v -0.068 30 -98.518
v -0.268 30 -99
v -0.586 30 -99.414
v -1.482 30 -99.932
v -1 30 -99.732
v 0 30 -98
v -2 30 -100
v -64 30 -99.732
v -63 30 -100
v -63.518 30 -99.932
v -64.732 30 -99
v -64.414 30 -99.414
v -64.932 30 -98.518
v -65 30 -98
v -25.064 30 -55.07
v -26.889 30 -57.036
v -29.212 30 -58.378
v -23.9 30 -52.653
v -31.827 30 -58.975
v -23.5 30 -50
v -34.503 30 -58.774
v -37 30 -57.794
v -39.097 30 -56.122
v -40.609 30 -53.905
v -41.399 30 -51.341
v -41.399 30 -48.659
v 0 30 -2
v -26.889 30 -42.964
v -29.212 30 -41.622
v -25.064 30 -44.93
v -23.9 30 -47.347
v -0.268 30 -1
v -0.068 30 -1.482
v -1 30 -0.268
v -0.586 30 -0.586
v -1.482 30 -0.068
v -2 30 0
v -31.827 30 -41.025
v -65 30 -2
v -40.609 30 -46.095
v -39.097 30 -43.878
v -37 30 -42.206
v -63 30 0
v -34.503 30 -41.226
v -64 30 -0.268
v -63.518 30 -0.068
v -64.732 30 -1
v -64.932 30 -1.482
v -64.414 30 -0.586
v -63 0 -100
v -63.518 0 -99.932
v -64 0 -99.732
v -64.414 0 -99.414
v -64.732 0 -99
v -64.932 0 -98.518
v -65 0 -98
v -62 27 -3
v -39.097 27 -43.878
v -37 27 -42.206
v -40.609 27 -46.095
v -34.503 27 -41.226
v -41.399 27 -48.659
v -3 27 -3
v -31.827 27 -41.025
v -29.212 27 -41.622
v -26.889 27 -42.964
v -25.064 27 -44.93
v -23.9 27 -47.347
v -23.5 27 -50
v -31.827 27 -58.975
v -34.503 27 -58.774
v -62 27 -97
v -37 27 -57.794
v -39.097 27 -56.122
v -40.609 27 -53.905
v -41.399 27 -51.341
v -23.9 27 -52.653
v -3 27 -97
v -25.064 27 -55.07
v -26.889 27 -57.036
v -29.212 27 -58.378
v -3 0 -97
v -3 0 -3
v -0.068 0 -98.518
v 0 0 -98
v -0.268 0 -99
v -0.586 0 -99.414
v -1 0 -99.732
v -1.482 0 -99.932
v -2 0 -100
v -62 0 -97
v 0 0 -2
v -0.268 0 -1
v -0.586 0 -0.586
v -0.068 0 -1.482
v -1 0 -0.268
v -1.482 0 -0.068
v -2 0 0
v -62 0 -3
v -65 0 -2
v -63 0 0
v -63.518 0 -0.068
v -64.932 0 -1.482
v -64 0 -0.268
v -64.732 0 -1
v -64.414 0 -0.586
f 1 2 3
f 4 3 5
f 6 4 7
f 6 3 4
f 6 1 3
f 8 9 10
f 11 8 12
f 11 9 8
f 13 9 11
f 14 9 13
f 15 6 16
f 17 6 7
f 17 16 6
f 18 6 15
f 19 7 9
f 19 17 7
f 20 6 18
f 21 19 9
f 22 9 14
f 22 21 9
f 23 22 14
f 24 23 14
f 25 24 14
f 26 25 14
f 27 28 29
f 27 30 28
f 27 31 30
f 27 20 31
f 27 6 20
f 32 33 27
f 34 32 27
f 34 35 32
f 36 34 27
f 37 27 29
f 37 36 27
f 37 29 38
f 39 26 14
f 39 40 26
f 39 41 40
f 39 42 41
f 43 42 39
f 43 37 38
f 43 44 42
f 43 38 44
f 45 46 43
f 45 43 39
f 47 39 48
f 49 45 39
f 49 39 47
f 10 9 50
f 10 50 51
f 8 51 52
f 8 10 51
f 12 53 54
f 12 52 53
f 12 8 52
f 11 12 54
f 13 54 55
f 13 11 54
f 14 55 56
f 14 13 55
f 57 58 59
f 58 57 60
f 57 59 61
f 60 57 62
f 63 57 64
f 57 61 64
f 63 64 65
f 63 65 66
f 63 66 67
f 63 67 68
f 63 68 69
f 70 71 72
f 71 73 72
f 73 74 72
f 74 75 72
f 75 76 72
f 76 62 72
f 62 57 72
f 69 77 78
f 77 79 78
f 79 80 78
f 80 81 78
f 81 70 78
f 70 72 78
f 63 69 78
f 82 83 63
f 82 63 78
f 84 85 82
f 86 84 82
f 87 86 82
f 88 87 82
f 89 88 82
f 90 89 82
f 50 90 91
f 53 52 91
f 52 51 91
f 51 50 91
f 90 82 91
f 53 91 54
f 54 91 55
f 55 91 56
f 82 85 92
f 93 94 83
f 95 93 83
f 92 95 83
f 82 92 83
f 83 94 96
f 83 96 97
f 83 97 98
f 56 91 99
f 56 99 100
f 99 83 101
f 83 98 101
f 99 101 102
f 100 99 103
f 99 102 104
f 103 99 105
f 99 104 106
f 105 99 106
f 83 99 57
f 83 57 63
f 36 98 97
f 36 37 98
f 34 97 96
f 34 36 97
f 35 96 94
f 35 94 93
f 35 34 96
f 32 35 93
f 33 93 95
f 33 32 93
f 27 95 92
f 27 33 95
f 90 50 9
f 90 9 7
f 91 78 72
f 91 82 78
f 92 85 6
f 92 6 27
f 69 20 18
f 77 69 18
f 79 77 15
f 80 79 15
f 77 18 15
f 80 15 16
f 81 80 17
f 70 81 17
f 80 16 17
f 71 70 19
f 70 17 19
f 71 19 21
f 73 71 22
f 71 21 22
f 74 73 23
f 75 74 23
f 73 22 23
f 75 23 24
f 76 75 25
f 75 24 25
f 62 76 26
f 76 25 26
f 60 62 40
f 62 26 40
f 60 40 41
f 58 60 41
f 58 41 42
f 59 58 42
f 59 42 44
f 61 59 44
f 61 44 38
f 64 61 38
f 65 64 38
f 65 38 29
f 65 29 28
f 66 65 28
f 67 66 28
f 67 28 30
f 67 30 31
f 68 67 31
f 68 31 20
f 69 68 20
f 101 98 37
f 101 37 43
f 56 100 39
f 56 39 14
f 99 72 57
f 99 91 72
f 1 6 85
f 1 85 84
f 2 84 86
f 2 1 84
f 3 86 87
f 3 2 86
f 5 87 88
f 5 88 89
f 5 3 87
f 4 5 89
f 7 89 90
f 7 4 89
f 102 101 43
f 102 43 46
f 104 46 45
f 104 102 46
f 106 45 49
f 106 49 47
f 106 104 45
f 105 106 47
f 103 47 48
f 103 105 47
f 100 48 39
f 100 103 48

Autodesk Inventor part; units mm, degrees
ref_plane "YZ Plane" through (0, 0, 0) normal (1, 0, 0) x (0, 1, 0)
ref_plane "XZ Plane" through (0, 0, 0) normal (0, 1, 0) x (-1, 0, 0)
ref_plane "XY Plane" through (0, 0, 0) normal (0, 0, 1) x (1, 0, 0)
sketch "Sketch1" plane through (0, 0, 0) normal (0, 1, 0) x (-1, 0, 0)
  line L0 (0, 0) -> (65, 0)
  line L1 (65, 0) -> (65, -100)
  line L2 (65, -100) -> (0, -100)
  line L3 (0, -100) -> (0, 0)
  line L4 (62, -3) -> (3, -3)
  line L5 (3, -3) -> (3, -97)
  line L6 (3, -97) -> (62, -97)
  line L7 (62, -97) -> (62, -3)
  dimension "d0" = 100
  dimension "d1" = 65
  dimension "d2" = 3
  dimension "d3" = 3
  dimension "d5" = 3
  dimension "d6" = 3
extrude "Extrusion1" add sketch "Sketch1" along normal blind 30
sketch "Sketch2" plane through (-62, 0, -97) normal (0, 0, 1) x (1, 0, 0)
  line L0 (62, 30) -> (-3, 30) projected
  line L1 (-3, 0) -> (-3, 30) projected
  line L2 (62, 30) -> (-3, 30)
  line L3 (-3, 30) -> (-3, 27)
  line L4 (-3, 27) -> (62, 27)
  line L5 (62, 27) -> (62, 30)
  point P0 (62, 0)
  dimension "d9" = 3
extrude "Extrusion2" add sketch "Sketch2" along normal blind 97
sketch "Sketch3" plane through (0, 30, 0) normal (0, 1, 0) x (1, 0, 0)
  circle A0 centre (-32.5, 50) radius 9
  line L0 (-65, 100) -> (-65, 0) projected
  line L1 (0, 0) -> (0, 100) projected
  line L2 (-65, 0) -> (0, 0) projected
  line L3 (0, 100) -> (-65, 100) projected
  dimension "d12" = 18
  dimension "d14" = 32.5
  dimension "d15" = 32.5
  dimension "d16" = 50
  dimension "d17" = 50
extrude "Extrusion3" cut sketch "Sketch3" against normal blind 97 contours A0
fillet "Fillet1" radius 2 4 edges at (0, 15, 0) (-65, 15, 0) (0, 15, -100) (-65, 15, -100)
equation "\"d14\" = d15"
equation "\"d16\" = d17"
properties part number "NadstavbaArduinoHranata"
